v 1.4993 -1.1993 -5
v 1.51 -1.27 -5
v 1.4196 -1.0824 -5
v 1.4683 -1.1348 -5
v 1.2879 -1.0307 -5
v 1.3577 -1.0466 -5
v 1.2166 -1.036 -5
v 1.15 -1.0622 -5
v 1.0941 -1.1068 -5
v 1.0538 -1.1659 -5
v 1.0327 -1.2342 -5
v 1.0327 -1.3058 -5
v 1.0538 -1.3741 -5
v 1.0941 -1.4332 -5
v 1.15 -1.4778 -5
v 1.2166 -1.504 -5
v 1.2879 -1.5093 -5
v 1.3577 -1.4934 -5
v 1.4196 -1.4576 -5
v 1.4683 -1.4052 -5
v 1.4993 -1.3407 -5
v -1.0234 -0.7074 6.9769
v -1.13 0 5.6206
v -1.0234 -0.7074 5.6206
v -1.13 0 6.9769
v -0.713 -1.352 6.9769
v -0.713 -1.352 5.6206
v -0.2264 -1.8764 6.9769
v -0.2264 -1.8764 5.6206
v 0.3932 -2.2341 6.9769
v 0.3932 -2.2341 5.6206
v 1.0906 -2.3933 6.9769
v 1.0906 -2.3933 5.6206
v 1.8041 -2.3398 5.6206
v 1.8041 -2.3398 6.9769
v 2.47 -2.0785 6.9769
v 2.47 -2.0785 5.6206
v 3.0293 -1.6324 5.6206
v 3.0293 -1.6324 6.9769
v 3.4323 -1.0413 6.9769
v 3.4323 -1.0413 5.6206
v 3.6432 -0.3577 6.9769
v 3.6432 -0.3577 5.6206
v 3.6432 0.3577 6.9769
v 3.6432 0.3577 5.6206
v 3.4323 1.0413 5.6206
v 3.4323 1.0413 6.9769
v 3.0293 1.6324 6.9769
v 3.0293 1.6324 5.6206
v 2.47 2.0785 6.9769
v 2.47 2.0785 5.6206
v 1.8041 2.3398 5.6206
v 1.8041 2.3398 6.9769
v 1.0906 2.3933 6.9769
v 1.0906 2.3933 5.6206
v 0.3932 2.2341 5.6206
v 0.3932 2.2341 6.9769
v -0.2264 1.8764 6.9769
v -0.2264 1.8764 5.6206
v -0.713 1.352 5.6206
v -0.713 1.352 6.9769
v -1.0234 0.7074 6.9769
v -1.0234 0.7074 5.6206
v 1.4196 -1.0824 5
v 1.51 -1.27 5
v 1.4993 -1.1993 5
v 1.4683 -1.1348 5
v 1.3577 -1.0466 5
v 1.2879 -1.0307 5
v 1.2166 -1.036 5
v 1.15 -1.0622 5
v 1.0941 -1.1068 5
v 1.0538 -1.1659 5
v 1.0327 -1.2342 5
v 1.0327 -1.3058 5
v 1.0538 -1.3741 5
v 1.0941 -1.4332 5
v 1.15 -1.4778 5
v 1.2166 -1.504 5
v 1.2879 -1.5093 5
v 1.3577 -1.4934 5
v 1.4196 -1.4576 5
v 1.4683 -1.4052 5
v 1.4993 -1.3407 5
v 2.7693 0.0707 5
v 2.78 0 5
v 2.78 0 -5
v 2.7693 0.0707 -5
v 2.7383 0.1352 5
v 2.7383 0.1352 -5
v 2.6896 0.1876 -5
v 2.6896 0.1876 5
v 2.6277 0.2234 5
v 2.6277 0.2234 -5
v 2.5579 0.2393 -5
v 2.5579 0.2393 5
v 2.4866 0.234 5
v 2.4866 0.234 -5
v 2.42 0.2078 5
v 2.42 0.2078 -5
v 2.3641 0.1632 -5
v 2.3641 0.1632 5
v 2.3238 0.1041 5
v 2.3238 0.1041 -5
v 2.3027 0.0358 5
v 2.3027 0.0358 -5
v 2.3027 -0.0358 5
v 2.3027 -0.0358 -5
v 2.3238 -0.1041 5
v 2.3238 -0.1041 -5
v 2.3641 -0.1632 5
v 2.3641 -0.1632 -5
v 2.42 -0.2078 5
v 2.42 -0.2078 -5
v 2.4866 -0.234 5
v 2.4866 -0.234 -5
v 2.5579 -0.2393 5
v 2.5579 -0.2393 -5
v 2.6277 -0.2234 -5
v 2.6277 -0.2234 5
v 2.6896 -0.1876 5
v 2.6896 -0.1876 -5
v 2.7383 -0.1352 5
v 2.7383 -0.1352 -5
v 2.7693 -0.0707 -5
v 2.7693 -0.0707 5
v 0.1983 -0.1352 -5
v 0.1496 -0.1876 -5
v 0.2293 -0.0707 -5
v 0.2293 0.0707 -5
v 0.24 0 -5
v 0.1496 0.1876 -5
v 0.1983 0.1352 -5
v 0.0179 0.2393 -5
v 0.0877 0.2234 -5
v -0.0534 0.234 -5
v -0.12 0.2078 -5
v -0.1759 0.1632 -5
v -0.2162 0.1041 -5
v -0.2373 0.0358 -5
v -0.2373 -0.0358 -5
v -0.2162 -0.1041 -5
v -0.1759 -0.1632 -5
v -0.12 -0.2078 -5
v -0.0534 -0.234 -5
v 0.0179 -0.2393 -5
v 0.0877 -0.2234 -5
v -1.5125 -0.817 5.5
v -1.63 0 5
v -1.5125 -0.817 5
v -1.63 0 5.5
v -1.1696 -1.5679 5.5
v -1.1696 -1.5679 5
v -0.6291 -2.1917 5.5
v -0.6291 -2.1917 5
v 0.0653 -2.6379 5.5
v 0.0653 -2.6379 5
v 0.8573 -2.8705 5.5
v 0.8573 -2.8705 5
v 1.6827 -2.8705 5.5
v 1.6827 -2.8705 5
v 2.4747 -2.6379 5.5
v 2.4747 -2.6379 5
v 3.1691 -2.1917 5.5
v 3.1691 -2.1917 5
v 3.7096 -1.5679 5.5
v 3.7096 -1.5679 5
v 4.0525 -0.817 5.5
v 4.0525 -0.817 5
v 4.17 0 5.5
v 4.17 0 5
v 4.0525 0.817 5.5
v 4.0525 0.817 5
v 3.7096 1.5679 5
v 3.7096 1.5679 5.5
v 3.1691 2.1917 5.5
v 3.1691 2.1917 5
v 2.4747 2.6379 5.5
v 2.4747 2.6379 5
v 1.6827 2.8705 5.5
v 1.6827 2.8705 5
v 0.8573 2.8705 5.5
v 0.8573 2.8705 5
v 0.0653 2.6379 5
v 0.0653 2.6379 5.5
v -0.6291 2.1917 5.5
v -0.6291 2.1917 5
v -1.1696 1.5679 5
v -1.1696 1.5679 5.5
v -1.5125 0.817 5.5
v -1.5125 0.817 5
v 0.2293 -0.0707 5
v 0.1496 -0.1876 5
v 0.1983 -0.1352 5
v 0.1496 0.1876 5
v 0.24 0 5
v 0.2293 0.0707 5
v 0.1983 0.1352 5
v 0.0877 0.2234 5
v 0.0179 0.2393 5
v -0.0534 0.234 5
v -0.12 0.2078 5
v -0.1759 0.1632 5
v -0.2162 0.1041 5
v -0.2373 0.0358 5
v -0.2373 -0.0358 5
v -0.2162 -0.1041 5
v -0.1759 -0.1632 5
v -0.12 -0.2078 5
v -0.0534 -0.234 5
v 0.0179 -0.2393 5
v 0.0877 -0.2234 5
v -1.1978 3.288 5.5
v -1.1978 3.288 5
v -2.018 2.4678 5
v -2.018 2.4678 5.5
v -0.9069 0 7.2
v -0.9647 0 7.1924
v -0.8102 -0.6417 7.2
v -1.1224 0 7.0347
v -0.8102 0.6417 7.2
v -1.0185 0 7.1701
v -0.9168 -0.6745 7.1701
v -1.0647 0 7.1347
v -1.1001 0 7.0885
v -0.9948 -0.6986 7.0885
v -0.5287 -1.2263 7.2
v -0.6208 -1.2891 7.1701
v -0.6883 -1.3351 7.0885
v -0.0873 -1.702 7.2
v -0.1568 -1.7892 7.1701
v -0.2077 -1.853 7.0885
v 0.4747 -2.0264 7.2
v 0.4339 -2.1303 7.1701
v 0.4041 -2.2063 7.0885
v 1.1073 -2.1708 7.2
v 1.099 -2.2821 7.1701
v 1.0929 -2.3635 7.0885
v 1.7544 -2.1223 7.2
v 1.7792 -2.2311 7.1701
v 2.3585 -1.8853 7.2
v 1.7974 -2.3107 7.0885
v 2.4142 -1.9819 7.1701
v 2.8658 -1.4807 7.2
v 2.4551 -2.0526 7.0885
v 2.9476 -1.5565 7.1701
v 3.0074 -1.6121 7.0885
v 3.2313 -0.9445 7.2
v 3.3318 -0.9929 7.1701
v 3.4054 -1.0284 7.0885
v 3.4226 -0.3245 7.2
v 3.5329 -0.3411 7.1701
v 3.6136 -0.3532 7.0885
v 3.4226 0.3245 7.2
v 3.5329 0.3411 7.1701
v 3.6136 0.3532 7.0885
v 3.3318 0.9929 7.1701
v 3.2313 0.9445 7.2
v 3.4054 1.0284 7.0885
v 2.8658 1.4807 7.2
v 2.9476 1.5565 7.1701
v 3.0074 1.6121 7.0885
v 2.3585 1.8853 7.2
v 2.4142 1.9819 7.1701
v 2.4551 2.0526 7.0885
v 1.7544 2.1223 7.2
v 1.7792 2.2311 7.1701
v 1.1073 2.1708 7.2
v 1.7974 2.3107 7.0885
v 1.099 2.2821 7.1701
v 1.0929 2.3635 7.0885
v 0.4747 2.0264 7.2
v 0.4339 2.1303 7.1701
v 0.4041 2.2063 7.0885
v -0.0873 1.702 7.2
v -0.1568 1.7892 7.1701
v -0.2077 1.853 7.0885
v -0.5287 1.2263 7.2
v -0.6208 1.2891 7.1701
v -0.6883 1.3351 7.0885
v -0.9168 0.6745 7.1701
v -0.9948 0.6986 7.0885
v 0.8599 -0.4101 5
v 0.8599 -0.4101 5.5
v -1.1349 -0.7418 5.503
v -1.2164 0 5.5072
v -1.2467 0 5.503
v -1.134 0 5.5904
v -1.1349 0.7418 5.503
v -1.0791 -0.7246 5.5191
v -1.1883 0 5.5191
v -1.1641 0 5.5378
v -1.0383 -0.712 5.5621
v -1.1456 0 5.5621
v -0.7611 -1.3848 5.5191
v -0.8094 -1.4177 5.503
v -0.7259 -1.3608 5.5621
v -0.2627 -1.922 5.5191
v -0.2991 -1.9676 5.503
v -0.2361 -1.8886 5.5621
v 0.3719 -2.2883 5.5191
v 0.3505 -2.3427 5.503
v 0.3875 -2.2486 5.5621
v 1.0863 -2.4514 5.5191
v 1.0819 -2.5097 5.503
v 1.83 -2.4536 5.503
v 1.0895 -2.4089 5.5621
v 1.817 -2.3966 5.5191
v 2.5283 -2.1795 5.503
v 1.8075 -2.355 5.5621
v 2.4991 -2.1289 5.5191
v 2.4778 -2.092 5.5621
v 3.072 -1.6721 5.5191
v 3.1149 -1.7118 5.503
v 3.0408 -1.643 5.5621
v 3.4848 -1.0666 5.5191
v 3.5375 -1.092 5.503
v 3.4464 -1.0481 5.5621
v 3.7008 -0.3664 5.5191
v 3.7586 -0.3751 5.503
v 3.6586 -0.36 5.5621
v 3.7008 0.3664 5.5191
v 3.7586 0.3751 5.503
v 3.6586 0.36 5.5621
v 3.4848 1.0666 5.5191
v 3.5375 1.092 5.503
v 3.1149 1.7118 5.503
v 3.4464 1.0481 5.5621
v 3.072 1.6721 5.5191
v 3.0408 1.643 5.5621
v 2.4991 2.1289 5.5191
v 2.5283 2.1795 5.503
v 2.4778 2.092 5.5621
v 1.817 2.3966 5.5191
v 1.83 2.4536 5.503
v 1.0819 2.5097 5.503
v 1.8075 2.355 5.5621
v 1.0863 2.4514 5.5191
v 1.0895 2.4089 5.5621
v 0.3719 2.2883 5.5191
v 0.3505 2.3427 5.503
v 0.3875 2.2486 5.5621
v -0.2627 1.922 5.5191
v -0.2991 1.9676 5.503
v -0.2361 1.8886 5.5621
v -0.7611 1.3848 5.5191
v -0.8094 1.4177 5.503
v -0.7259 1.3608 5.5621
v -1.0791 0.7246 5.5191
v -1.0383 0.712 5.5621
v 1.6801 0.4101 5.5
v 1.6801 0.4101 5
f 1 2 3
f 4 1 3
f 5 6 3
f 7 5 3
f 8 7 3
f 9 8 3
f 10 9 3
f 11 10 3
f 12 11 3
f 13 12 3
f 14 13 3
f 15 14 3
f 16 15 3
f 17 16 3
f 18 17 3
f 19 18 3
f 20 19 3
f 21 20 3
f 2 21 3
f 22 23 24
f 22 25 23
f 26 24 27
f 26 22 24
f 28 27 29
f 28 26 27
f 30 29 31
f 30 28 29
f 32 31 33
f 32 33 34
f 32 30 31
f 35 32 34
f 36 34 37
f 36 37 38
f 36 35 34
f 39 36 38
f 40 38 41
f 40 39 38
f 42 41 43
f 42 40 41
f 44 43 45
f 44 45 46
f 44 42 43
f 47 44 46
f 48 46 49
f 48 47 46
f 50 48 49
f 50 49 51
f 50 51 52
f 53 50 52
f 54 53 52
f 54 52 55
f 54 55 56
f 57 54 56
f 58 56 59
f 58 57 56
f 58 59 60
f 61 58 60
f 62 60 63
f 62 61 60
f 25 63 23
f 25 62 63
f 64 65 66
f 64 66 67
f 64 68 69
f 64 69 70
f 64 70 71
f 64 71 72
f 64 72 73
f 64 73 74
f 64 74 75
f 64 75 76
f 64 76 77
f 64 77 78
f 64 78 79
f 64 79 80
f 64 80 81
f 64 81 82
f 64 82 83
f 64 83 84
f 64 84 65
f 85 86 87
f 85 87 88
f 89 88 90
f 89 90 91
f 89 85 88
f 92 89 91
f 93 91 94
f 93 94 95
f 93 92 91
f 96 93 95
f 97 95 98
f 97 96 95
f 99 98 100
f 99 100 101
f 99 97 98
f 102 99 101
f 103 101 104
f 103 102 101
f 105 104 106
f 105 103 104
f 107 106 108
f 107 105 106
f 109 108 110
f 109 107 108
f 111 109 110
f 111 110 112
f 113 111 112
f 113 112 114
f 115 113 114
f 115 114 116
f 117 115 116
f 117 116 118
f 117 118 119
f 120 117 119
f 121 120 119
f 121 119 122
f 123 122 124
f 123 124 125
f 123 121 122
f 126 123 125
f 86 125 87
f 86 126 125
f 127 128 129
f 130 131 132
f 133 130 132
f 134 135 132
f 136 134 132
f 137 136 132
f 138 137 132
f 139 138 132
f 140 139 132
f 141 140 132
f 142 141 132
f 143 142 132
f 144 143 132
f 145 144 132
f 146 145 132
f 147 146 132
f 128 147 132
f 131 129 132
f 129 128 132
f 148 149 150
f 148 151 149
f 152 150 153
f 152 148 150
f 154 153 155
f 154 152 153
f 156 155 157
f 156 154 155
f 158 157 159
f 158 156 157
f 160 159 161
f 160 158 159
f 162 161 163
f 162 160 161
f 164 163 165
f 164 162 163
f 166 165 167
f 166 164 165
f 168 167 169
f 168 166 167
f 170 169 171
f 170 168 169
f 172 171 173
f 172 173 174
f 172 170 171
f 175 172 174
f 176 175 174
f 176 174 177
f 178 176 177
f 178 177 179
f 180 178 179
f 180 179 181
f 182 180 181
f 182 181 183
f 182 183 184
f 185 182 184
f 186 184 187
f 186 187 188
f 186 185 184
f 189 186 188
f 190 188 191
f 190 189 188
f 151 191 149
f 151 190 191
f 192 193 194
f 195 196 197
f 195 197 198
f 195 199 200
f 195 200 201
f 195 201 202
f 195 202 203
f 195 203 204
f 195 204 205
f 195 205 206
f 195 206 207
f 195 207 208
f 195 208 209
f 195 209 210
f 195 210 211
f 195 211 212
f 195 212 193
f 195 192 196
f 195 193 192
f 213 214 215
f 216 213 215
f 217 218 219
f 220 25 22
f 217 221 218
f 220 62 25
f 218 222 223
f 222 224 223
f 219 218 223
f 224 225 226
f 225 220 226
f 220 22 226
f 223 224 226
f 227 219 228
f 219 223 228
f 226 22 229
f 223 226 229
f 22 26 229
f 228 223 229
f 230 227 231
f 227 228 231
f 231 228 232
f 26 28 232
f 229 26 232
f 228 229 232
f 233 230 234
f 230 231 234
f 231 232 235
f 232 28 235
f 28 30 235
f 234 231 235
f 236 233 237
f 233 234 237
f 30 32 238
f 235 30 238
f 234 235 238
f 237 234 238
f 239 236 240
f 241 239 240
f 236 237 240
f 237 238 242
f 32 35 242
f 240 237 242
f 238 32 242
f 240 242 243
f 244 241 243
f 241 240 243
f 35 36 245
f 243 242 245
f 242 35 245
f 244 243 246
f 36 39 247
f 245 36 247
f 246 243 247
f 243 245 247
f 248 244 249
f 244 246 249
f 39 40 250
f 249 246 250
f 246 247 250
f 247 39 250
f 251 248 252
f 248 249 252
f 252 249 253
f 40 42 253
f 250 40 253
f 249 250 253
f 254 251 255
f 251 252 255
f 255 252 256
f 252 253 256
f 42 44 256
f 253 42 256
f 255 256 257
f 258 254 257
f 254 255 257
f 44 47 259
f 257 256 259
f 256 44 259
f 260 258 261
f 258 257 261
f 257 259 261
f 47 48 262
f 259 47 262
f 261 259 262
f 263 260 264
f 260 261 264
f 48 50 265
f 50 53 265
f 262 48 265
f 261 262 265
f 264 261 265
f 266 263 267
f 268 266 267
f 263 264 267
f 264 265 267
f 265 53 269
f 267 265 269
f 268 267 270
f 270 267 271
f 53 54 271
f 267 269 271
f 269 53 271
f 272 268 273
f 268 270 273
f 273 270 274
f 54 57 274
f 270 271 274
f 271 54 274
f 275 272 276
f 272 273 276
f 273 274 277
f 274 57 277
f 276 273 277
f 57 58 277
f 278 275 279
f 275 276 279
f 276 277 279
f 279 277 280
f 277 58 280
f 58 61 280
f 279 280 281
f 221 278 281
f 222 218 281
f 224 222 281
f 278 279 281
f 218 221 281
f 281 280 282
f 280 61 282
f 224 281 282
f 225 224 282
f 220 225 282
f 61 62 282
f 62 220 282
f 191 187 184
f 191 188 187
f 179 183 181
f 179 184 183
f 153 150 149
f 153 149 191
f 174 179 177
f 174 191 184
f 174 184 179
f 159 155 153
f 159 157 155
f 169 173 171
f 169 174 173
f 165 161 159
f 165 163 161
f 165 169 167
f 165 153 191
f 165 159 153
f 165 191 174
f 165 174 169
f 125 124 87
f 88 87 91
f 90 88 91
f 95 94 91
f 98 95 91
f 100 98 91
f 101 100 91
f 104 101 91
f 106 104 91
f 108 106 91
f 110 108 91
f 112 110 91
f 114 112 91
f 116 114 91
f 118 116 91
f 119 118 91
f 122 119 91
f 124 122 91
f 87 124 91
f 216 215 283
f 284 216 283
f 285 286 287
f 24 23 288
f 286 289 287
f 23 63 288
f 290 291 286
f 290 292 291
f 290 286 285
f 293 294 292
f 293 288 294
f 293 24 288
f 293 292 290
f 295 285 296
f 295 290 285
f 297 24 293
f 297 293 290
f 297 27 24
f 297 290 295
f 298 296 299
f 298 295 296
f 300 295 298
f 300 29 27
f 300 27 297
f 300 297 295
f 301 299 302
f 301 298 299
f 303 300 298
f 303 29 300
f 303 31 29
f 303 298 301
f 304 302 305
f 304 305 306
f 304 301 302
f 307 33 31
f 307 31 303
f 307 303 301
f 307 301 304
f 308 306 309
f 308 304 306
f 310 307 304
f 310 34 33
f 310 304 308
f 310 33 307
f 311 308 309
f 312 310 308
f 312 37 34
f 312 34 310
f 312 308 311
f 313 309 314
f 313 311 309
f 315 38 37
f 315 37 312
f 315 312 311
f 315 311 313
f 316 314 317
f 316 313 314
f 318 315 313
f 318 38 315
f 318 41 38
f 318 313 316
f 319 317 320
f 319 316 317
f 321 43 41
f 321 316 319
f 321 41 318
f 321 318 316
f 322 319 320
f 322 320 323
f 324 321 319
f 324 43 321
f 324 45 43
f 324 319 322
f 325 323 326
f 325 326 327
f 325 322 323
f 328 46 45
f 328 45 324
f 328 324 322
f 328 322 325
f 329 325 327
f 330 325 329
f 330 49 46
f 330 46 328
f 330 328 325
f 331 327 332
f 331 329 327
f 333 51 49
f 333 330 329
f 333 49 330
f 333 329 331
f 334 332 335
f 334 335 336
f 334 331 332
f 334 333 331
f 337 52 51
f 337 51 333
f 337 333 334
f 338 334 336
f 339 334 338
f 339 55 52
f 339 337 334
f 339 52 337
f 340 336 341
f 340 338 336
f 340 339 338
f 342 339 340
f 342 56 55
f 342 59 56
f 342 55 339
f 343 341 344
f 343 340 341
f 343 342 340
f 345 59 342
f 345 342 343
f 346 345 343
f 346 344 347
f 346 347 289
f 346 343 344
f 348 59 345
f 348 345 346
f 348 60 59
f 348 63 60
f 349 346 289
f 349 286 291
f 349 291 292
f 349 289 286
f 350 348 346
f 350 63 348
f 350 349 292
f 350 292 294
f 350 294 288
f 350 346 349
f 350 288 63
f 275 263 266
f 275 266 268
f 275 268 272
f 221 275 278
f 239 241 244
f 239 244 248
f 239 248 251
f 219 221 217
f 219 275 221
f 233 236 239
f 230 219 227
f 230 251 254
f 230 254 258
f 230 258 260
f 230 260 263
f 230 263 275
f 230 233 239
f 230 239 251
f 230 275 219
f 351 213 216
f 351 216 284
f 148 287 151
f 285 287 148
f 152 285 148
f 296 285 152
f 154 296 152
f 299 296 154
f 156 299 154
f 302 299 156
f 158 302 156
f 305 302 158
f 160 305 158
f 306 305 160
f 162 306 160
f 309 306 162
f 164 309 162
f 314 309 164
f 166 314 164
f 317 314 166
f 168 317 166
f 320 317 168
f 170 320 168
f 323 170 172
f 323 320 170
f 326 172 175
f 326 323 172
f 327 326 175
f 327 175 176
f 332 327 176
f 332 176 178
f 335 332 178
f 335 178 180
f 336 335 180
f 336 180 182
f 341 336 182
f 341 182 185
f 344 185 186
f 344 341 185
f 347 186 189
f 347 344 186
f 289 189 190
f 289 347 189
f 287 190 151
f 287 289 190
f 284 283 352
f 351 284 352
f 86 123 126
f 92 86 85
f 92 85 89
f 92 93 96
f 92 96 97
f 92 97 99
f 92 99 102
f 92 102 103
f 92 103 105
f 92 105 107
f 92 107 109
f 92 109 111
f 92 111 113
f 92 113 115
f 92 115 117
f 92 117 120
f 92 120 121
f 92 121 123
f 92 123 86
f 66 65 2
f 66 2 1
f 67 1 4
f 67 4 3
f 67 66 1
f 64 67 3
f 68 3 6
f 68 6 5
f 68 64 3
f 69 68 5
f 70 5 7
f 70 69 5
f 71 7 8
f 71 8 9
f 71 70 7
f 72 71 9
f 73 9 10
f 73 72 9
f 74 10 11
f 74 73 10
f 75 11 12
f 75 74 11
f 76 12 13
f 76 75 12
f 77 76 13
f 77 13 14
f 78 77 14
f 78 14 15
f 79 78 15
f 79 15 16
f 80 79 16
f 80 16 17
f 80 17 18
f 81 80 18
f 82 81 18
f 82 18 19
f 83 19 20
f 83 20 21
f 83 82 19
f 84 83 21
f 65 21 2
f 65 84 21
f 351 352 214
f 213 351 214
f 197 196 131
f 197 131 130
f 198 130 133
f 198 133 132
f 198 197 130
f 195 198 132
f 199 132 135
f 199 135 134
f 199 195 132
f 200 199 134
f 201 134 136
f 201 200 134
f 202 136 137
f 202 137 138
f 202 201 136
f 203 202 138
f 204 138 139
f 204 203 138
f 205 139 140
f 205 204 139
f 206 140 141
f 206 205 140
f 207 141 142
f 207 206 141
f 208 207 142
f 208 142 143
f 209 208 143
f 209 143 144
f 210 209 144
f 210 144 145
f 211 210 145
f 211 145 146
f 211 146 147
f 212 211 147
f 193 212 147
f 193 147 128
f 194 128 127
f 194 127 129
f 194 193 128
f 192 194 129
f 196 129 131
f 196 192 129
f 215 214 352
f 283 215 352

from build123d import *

# Parameters (mm, degrees)
SKETCH_R     = 0.24
PAD_DEPTH    = 10
PAD003_DEPTH = 0.5


with BuildPart() as pad:
    # Sketch → Pad (new body)
    with BuildSketch(Plane.XY.offset(5)):
        Circle(SKETCH_R)
        with Locations((2.54, 0)):
            Circle(SKETCH_R)
        with Locations((1.27, -1.27)):
            Circle(SKETCH_R)
    extrude(amount=-PAD_DEPTH)


with BuildPart() as revolution:
    # Sketch003 → Revolution (revolve)
    with BuildSketch(Plane.XZ):
        with BuildLine():
            Line((1.27, 5), (-1.63, 5))
            Line((-1.63, 5), (-1.63, 5.5))
            Line((-1.63, 5.5), (-1.246699, 5.503024))
            ThreePointArc((-1.246699, 5.503024), (-1.164125, 5.537801), (-1.13, 5.620646))
            Line((-1.13, 5.620646), (-1.13, 6.97692))
            ThreePointArc((-0.90692, 7.2), (-1.064661, 7.134661), (-1.13, 6.97692))
            Line((-0.90692, 7.2), (1.27, 7.2))
            Line((1.27, 7.2), (1.27, 5))
        make_face()
    revolve(axis=Axis((1.27, 0, 2.550668), (0, 0, 1)))


with BuildPart() as pad003:
    # Sketch004 → Pad003 (new body)
    with BuildSketch(Plane.XY.offset(5)):
        Polygon((1.680122, 0.410122), (-1.197803, 3.288047), (-2.018047, 2.467803), (0.859878, -0.410122), align=None)
    extrude(amount=PAD003_DEPTH)


solid = Compound([pad.part, revolution.part, pad003.part])
